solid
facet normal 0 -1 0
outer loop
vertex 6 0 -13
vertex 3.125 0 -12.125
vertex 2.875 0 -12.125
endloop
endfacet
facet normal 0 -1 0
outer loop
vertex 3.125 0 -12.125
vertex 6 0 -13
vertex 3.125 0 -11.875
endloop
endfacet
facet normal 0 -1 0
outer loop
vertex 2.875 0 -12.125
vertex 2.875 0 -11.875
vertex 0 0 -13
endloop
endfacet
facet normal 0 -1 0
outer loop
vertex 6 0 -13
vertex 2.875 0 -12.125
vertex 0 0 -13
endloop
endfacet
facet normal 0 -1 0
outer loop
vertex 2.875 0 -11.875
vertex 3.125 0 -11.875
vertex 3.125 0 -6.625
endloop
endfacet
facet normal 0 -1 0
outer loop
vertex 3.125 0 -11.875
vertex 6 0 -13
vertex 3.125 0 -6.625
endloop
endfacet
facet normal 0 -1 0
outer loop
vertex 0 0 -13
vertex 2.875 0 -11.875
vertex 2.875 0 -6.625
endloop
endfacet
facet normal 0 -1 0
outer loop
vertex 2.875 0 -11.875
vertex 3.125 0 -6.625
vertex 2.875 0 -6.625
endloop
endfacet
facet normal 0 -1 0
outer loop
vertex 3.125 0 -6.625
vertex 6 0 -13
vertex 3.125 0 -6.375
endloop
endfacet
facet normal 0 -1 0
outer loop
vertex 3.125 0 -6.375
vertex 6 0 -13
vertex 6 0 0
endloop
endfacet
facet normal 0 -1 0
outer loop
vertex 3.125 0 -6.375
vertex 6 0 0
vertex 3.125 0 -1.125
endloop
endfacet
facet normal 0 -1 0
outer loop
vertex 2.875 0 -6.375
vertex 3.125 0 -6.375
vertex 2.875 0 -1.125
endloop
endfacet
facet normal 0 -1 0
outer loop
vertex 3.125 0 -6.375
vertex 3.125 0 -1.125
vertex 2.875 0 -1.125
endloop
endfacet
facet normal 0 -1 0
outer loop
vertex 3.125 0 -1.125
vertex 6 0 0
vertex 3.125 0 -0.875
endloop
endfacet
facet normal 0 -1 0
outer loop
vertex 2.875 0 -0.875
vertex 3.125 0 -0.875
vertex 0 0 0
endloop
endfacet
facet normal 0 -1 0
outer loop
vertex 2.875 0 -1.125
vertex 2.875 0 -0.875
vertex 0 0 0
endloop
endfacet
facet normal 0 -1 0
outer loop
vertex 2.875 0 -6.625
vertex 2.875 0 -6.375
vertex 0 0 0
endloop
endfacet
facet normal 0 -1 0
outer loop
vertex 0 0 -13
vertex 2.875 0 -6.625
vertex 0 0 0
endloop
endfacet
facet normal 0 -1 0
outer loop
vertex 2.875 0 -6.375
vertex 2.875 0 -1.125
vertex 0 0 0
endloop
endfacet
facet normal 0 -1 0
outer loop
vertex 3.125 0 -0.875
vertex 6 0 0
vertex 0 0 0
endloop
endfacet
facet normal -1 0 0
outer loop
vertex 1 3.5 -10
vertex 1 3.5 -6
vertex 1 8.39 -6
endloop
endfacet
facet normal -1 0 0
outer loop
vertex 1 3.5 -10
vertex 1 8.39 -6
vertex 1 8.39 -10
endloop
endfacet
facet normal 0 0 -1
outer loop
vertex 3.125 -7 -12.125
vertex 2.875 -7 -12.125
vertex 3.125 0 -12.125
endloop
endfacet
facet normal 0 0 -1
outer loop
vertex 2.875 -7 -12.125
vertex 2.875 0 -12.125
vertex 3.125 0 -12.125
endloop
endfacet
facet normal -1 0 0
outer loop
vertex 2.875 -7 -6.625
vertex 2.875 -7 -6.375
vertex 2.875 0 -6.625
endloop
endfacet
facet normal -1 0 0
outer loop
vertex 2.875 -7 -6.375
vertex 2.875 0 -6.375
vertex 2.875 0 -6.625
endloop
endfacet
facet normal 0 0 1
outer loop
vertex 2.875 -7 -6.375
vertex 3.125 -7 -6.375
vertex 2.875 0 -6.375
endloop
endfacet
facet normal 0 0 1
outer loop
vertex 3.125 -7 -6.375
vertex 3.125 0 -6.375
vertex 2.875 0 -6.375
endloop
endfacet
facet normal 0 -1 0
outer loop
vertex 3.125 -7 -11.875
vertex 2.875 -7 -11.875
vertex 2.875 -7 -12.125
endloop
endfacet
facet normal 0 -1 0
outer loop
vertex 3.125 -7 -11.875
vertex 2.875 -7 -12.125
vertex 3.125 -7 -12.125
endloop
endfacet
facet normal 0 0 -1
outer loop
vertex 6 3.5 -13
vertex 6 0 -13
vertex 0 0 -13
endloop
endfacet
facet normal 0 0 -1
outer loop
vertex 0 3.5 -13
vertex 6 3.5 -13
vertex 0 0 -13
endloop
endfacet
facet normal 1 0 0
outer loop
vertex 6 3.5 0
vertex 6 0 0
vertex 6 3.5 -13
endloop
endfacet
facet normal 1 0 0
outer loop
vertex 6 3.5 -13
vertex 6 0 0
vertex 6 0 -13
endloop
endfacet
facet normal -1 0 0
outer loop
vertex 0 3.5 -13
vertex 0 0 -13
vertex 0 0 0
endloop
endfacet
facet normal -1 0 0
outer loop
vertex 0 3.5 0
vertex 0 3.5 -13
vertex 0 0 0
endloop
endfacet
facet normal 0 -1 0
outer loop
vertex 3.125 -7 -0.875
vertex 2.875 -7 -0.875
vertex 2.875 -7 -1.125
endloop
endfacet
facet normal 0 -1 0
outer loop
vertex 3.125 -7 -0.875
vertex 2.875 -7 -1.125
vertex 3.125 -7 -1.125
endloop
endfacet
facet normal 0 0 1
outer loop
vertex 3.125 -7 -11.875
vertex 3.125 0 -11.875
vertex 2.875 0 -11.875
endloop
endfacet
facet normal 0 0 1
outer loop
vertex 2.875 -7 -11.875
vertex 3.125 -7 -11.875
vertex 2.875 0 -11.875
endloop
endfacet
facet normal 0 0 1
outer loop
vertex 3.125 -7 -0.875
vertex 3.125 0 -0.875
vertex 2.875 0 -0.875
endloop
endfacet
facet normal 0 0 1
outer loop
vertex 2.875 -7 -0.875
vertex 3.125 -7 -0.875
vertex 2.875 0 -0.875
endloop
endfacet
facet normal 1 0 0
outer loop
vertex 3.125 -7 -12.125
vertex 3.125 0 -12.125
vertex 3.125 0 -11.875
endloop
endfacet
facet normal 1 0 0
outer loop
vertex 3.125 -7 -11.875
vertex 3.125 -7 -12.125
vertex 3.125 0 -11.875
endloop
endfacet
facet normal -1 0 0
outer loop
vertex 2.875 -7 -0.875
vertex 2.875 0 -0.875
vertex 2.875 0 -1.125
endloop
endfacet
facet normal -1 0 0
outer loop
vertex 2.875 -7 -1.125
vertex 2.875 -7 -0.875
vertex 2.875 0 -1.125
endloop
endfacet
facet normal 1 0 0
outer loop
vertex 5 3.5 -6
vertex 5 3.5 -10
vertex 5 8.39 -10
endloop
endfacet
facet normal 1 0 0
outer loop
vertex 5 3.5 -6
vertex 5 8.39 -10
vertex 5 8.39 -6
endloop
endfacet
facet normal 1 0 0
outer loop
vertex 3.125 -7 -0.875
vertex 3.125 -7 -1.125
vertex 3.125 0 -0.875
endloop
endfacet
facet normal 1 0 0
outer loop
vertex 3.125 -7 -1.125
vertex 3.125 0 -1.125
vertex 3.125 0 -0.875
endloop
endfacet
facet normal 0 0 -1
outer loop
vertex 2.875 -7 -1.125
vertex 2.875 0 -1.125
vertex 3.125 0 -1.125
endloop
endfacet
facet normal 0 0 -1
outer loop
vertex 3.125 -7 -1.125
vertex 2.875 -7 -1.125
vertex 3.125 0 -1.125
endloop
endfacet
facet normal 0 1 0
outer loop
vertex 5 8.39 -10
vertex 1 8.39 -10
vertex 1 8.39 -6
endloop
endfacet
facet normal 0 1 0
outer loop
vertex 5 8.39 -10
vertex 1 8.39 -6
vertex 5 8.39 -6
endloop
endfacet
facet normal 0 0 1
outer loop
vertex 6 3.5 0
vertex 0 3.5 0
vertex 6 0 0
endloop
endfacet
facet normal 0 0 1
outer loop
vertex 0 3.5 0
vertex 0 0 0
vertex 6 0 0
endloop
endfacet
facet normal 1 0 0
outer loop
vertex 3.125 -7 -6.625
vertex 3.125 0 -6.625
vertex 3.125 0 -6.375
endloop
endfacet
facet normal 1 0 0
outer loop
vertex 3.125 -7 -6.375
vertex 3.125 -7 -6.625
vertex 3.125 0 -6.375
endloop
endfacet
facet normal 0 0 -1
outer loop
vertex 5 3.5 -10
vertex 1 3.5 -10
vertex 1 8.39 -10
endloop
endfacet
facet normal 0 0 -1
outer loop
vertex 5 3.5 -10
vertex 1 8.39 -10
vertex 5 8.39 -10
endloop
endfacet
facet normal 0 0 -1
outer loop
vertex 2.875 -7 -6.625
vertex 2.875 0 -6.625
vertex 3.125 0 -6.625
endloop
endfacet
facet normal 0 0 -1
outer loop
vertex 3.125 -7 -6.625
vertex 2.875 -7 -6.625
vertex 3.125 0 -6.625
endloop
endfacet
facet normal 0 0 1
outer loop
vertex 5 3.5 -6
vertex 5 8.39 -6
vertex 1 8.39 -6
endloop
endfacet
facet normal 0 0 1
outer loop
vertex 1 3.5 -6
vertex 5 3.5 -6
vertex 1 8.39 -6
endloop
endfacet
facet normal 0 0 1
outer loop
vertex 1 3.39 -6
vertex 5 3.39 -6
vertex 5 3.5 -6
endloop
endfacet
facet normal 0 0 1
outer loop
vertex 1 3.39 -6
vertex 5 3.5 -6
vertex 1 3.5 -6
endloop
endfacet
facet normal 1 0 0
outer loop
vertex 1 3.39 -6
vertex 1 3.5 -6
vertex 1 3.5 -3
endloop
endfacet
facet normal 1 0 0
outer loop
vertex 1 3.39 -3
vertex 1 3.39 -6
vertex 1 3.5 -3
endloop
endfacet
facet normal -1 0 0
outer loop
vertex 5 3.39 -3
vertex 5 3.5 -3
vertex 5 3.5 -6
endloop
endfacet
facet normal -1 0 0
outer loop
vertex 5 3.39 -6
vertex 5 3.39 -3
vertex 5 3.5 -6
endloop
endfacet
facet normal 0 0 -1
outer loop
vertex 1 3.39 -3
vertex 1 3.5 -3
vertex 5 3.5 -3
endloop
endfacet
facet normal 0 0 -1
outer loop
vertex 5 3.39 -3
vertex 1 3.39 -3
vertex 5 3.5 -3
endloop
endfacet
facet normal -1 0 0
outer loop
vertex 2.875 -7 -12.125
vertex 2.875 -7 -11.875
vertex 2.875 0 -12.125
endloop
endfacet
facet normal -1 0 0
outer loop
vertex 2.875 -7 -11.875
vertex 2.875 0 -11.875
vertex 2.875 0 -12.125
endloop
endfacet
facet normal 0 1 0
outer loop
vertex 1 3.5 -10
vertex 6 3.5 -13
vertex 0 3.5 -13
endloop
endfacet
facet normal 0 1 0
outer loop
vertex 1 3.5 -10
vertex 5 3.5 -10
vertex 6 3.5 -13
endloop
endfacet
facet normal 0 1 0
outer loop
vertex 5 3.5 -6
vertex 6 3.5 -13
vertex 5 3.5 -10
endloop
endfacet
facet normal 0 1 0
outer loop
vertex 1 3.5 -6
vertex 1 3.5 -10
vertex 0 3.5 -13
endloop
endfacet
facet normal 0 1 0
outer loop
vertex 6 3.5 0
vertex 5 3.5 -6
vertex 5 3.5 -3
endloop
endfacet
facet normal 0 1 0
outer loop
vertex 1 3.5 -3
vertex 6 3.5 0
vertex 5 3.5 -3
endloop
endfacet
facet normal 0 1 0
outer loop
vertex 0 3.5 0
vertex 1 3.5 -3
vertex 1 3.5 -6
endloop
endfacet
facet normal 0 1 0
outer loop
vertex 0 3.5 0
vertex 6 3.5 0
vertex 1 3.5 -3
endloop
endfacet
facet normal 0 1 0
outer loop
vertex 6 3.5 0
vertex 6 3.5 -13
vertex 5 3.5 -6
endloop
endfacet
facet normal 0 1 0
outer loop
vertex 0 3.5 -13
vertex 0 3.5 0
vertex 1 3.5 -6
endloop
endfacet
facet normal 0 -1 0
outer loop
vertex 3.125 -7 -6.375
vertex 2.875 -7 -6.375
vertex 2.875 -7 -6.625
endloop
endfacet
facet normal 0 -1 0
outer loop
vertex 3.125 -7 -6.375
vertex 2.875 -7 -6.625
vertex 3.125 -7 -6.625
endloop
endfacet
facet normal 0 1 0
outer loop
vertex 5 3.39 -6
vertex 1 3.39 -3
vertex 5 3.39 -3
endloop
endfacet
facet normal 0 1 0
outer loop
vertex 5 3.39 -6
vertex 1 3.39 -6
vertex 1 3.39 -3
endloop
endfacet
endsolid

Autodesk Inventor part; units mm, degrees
ref_plane "YZ Plane" through (0, 0, 0) normal (1, 0, 0) x (0, 1, 0)
ref_plane "XZ Plane" through (0, 0, 0) normal (0, 1, 0) x (-1, 0, 0)
ref_plane "XY Plane" through (0, 0, 0) normal (0, 0, 1) x (1, 0, 0)
sketch "Sketch1" plane through (0, 0, 0) normal (0, 1, 0) x (-1, 0, 0)
  line L0 (0, 0) -> (-6, 0)
  line L1 (-6, 0) -> (-6, -13)
  line L2 (-6, -13) -> (0, -13)
  line L3 (0, -13) -> (0, 0)
  dimension "d0" = 6
  dimension "d1" = 13
extrude "Extrusion1" add sketch "Sketch1" along normal blind 3.5
sketch "Sketch2" plane through (0, 3.5, 0) normal (0, 1, 0) x (1, 0, 0)
  line L0 (0, 13) -> (0, 0) projected
  line L1 (6, 0) -> (6, 13) projected
  line L2 (0, 0) -> (6, 0)
  line L3 (6, 0) -> (6, 13)
  line L4 (6, 13) -> (0, 13)
  line L5 (0, 13) -> (0, 0)
  line L6 (3, 0) -> (6.25, 0) construction
  line L7 (2, 3) -> (1.5, 3)
  line L8 (1.5, 3) -> (1, 3)
  line L9 (1.5, 3) -> (2, 3) construction
  line L10 (2, 3) -> (5, 3)
  line L11 (2, 3) -> (5, 3) construction
  line L12 (5, 3) -> (5, 10)
  line L13 (5, 10) -> (1, 10)
  line L14 (1, 10) -> (1, 3)
  line L15 (1, 3) -> (5, 3)
  line L16 (5, 3) -> (5, 10)
  line L17 (5, 10) -> (1, 10)
  line L18 (1, 10) -> (1, 3)
  dimension "d41" = 3
  dimension "d42" = 1
  dimension "d44" = 1
  dimension "d45" = 3
extrude "Extrusion3" cut sketch "Sketch2" against normal blind 0.11 contours L7 L8 L14 L13 L12 L10
sketch "Sketch3" plane through (0, 3.39, 0) normal (0, 1, 0) x (1, 0, 0)
  line L0 (1, 3) -> (1, 10) projected
  line L1 (1, 10) -> (5, 10)
  line L2 (5, 10) -> (5, 6)
  line L3 (5, 6) -> (1, 6)
  line L4 (1, 6) -> (1, 10)
  point P0 (0, 0)
  dimension "d20" = 4
  dimension "d21" = 4
extrude "Extrusion4" add sketch "Sketch3" along normal blind 5
sketch "Sketch4" plane through (0, 0, 0) normal (0, -1, 0) x (1, 0, 0)
  line L0 (0, 0) -> (6, 0) projected
  line L1 (3, 0) -> (3, -1) construction
  line L2 (3, 0) -> (4, 0) construction
  line L3 (2.875, -1.125) -> (3.125, -1.125)
  line L4 (3.125, -1.125) -> (3.125, -0.875)
  line L5 (3.125, -0.875) -> (2.875, -0.875)
  line L6 (2.875, -0.875) -> (2.875, -1.125)
  line L7 (2.875, -1.125) -> (3.125, -0.875) construction
  line L8 (3.125, -1.125) -> (2.875, -0.875) construction
  line L9 (6, -13) -> (0, -13) projected
  line L10 (3, -13) -> (3, -12) construction
  line L11 (3, -13) -> (4, -13) construction
  line L12 (2.875, -12.125) -> (3.125, -12.125)
  line L13 (3.125, -12.125) -> (3.125, -11.875)
  line L14 (3.125, -11.875) -> (2.875, -11.875)
  line L15 (2.875, -11.875) -> (2.875, -12.125)
  line L16 (2.875, -12.125) -> (3.125, -11.875) construction
  line L17 (3.125, -12.125) -> (2.875, -11.875) construction
  line L18 (3, -0.875) -> (3, -6.5) construction
  line L19 (3, -0.875) -> (8.625, -0.875) construction
  line L20 (2.875, -6.625) -> (3.125, -6.625)
  line L21 (3.125, -6.625) -> (3.125, -6.375)
  line L22 (3.125, -6.375) -> (2.875, -6.375)
  line L23 (2.875, -6.375) -> (2.875, -6.625)
  line L24 (2.875, -6.625) -> (3.125, -6.375) construction
  line L25 (3.125, -6.625) -> (2.875, -6.375) construction
  point P0 (3, -6.5)
  dimension "d24" = 1
  dimension "d25" = 90
  dimension "d26" = 0.25
  dimension "d27" = 0.25
  dimension "d28" = 1
  dimension "d29" = 90
  dimension "d30" = 0.25
  dimension "d31" = 0.25
  dimension "d33" = 90
  dimension "d34" = 0.25
  dimension "d35" = 0.25
  dimension "d39" = 5.5
  dimension "d40" = 5.5
extrude "Extrusion5" add sketch "Sketch4" along normal blind 7
equation "\"d41\" = d5"
equation "\"d44\" = d42"
equation "\"d45\" = d41"
equation "\"d21\" = d20"
equation "\"d24\" = d28"
equation "\"d5\" = 3"
properties part number "switch small"
